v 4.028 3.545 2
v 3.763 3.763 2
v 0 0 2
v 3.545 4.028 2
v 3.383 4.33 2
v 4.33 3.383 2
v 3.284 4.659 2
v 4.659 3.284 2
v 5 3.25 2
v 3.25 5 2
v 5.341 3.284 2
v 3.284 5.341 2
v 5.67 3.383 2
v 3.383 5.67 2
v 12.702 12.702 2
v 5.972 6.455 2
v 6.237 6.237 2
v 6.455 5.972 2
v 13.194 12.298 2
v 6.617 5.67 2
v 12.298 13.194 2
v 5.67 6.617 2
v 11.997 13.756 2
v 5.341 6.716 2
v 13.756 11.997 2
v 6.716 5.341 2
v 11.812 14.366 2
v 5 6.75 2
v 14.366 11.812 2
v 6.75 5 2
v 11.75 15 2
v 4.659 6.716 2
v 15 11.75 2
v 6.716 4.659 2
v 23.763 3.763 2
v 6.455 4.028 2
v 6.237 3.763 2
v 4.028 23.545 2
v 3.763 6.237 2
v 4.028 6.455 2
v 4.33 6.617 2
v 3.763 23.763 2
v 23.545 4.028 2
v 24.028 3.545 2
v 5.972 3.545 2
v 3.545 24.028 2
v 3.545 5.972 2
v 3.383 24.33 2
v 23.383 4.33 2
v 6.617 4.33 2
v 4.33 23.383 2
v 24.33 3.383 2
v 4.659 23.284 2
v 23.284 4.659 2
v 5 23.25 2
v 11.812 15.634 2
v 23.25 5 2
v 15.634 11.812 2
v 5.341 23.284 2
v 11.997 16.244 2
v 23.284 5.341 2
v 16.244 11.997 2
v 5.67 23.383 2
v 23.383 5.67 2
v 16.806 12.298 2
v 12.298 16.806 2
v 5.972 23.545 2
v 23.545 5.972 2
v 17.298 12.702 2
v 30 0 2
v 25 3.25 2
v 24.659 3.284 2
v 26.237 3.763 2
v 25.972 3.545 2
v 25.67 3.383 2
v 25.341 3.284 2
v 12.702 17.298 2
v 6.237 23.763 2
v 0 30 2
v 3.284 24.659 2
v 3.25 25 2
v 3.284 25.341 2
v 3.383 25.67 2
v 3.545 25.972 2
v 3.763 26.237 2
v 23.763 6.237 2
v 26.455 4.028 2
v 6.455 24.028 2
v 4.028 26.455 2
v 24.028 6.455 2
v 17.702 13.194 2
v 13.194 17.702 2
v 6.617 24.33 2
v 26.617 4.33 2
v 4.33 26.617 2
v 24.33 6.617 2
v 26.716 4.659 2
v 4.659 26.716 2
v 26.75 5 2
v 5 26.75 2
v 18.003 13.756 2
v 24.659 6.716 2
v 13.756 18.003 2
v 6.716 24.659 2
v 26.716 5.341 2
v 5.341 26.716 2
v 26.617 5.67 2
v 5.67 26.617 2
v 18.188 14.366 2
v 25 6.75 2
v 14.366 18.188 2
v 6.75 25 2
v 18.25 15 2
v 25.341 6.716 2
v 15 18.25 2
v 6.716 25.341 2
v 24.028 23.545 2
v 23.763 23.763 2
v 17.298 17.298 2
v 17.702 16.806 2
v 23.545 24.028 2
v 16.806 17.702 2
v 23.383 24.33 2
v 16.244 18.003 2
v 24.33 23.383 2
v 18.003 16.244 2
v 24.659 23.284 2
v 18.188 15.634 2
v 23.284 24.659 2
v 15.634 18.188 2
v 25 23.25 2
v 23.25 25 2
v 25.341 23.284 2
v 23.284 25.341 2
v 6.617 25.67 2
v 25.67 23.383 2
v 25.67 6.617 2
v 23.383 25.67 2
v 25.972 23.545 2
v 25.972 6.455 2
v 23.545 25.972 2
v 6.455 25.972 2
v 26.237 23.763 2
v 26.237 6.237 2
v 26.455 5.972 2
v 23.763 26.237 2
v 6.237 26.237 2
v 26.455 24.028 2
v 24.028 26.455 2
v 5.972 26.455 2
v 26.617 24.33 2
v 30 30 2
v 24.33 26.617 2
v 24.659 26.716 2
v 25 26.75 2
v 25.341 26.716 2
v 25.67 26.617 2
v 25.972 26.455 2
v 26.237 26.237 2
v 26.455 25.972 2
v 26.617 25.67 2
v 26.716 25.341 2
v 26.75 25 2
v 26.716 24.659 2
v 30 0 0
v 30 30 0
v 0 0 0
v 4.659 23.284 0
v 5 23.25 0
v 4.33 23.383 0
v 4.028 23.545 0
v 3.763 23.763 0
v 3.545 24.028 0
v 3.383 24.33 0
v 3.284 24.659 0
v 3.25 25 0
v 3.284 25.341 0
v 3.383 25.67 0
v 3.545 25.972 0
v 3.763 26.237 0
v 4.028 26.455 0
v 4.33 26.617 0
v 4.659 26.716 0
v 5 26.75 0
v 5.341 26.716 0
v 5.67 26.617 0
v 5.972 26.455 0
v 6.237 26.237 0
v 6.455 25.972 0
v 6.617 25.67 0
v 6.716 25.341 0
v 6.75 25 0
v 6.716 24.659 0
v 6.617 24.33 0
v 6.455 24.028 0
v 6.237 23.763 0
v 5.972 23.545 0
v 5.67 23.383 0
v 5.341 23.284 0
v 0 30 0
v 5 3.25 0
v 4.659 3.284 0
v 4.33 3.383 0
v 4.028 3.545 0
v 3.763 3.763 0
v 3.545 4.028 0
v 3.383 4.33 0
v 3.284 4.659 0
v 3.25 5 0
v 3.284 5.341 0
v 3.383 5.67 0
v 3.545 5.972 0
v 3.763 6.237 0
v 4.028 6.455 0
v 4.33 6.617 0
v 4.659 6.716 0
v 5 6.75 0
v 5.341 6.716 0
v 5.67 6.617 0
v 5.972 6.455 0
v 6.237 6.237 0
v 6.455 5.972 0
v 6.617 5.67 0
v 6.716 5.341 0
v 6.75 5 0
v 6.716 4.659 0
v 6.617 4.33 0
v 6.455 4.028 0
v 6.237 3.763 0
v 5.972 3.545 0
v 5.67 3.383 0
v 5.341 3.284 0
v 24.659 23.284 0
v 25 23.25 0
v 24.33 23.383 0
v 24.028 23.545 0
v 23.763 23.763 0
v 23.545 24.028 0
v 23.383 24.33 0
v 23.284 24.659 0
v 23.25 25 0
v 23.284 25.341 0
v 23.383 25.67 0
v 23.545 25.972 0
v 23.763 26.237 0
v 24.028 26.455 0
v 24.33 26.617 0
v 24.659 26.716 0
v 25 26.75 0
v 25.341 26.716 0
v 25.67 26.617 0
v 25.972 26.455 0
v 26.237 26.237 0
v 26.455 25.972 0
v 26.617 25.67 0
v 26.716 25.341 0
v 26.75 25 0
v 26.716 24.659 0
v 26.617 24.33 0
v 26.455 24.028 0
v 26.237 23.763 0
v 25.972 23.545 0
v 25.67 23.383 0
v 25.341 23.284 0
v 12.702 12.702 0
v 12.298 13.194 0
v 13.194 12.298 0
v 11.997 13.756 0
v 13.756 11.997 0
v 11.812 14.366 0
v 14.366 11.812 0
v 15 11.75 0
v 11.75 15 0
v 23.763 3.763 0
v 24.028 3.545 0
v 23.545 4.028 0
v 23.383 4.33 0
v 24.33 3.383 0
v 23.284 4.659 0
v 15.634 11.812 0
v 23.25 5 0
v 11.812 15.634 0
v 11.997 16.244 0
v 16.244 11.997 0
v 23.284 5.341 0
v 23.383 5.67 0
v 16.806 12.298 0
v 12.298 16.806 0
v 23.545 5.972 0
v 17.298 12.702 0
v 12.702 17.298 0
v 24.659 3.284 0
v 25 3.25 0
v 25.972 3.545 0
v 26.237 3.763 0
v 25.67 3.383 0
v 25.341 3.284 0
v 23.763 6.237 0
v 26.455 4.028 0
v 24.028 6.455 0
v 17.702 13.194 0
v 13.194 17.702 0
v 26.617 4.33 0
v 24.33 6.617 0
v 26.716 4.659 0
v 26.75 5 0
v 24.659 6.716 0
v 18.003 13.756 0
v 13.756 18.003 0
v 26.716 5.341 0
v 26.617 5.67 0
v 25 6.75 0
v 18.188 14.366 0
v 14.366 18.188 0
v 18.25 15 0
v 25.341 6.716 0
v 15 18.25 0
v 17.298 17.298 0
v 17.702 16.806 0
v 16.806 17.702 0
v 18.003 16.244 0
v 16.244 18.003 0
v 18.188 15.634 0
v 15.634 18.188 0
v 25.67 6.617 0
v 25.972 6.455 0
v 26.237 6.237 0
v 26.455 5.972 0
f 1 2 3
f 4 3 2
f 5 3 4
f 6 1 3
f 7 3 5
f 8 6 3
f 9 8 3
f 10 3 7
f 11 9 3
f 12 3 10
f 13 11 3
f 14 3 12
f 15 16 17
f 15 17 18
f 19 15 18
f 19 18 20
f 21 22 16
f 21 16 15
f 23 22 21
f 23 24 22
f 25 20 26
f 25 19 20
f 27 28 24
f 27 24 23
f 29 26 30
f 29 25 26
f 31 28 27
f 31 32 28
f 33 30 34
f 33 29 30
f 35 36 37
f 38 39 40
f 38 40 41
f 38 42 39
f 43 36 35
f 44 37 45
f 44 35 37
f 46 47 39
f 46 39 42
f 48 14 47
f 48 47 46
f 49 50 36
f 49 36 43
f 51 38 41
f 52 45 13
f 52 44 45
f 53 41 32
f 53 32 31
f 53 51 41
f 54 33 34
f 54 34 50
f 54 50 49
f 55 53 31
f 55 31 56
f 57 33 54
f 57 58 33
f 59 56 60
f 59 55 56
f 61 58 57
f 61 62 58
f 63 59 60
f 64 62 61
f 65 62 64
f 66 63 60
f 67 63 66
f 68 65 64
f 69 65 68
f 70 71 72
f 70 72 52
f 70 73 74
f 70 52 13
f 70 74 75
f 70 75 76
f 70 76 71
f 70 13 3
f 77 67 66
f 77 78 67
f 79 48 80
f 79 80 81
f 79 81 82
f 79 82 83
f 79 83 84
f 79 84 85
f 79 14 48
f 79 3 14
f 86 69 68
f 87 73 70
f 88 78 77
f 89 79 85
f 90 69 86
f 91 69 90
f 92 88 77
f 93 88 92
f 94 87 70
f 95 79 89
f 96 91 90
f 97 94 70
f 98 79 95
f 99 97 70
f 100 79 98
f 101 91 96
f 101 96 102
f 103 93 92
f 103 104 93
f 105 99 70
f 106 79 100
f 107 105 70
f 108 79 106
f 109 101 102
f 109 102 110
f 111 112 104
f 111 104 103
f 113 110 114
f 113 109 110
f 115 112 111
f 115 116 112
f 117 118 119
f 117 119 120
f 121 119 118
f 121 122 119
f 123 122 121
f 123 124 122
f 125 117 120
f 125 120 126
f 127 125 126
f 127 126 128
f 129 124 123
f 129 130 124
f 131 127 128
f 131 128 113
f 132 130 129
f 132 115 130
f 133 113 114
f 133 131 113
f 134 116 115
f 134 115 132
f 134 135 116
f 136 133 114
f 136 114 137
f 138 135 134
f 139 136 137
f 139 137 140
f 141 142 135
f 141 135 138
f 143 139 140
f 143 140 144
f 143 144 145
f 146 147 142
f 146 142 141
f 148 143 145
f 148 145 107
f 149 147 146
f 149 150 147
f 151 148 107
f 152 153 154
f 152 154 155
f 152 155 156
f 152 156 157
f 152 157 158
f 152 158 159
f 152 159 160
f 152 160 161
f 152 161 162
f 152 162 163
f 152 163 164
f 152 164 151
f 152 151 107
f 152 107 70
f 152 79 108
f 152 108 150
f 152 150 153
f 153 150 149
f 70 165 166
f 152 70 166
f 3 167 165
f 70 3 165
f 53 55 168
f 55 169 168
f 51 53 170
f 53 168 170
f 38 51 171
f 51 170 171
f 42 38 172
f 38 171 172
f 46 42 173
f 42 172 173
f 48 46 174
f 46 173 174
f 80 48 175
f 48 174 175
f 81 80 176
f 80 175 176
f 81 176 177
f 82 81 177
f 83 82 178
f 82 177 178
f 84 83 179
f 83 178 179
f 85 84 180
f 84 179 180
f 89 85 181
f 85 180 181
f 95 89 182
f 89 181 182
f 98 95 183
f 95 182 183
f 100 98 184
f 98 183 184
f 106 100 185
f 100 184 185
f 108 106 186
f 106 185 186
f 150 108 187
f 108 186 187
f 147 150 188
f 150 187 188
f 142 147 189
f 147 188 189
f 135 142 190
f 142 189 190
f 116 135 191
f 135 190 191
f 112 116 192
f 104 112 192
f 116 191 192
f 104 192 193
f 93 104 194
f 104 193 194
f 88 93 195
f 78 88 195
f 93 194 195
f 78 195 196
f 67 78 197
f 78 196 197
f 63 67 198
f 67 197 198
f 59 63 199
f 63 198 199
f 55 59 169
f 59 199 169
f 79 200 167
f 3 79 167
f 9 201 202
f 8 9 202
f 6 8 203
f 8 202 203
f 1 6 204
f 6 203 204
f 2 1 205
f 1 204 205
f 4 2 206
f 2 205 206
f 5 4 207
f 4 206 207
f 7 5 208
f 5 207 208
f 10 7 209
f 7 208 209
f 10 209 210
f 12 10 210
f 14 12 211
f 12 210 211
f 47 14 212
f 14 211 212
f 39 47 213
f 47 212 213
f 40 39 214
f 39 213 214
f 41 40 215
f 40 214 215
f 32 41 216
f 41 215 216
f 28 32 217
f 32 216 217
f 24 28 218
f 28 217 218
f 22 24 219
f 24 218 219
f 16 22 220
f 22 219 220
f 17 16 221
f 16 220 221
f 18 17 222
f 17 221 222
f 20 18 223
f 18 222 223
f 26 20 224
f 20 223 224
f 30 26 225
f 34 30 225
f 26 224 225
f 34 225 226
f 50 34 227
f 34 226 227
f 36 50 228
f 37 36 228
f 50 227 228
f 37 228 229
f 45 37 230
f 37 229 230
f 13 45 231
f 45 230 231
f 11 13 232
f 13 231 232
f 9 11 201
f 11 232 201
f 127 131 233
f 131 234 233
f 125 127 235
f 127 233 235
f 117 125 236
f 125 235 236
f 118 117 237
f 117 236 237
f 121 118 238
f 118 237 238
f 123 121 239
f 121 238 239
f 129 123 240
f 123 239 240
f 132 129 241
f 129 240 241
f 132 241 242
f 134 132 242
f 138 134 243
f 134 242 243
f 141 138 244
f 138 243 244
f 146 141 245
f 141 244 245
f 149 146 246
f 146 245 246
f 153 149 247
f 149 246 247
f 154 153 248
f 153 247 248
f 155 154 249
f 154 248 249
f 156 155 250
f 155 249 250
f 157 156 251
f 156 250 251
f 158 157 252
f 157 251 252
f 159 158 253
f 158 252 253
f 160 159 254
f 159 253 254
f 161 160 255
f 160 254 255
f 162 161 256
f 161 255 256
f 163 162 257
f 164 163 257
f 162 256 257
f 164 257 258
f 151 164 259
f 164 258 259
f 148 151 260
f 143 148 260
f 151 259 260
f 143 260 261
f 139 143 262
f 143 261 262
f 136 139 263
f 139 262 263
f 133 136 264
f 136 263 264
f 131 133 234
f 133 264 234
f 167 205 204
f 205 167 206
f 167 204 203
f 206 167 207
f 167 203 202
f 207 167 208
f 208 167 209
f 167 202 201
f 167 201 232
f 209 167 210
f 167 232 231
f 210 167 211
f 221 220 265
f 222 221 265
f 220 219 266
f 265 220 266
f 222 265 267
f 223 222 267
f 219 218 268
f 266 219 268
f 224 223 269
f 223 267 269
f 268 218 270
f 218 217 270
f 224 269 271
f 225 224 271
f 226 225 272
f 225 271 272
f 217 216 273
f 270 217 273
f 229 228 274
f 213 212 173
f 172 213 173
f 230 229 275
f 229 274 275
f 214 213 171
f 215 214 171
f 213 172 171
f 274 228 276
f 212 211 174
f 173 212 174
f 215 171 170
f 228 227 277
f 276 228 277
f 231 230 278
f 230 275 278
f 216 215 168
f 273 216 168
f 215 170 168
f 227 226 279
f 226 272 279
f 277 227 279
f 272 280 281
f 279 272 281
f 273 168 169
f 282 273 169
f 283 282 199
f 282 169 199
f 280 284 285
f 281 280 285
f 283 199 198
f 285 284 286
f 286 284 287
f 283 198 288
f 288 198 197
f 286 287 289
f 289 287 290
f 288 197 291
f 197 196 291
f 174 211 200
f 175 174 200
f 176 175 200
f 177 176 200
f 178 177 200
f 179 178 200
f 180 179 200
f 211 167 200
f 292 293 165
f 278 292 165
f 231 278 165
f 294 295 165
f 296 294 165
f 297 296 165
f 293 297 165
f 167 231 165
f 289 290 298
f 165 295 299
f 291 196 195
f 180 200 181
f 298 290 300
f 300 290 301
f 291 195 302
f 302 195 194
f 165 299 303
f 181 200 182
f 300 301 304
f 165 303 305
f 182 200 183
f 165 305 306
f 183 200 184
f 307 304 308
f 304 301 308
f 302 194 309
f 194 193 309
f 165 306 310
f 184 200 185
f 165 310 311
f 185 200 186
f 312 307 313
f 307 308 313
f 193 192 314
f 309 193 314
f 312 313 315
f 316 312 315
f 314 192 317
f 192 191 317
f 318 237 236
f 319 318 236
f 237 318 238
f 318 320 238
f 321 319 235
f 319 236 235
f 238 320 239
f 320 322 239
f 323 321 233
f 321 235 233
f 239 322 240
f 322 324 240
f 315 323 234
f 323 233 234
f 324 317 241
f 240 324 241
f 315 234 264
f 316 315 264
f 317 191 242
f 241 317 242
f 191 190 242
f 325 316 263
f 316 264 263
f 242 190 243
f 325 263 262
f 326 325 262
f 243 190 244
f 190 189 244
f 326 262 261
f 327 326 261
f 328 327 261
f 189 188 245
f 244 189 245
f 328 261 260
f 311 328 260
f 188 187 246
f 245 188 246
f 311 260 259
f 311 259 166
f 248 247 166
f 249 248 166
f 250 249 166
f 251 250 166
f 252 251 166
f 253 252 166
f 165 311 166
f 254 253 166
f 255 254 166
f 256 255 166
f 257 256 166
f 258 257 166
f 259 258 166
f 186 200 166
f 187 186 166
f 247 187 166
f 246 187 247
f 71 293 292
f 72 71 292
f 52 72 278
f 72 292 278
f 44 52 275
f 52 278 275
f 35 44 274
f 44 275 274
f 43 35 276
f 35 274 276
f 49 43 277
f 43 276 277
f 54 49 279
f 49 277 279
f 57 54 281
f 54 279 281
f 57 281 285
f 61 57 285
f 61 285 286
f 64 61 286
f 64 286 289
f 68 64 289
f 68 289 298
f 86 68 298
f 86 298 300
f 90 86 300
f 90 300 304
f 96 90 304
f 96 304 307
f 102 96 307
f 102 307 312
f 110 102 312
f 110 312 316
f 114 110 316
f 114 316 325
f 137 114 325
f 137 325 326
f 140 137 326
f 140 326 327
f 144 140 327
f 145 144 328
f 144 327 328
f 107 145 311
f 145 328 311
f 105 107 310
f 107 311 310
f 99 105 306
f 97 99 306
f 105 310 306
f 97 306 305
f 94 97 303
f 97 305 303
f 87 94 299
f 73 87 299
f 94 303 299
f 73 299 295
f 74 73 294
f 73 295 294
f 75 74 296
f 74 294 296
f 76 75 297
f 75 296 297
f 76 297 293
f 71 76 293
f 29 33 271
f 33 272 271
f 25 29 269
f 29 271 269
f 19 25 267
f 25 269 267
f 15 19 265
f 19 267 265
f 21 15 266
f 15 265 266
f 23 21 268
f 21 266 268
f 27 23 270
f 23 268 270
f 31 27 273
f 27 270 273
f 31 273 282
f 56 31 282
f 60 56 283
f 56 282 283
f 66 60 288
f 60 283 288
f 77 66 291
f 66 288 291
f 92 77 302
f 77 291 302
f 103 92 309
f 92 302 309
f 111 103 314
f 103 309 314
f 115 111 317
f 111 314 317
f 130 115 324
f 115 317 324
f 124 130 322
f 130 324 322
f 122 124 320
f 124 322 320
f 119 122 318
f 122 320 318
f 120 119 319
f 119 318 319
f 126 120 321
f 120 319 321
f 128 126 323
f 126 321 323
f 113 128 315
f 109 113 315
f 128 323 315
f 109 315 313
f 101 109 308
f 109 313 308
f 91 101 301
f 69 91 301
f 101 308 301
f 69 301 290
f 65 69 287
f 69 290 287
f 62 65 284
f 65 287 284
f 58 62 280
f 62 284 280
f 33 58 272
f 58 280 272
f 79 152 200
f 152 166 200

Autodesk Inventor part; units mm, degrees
ref_plane "YZ Plane" through (0, 0, 0) normal (1, 0, 0) x (0, 1, 0)
ref_plane "XZ Plane" through (0, 0, 0) normal (0, 1, 0) x (-1, 0, 0)
ref_plane "XY Plane" through (0, 0, 0) normal (0, 0, 1) x (1, 0, 0)
sketch "スケッチ1" plane through (0, 0, 0) normal (0, 0, 1) x (1, 0, 0)
  line L0 (0, 0) -> (30, 0)
  line L1 (30, 0) -> (30, 30)
  line L2 (30, 30) -> (0, 30)
  line L3 (0, 30) -> (0, 0)
  dimension "d0" = 30
  dimension "d1" = 30
extrude "押し出し1" add sketch "スケッチ1" along normal blind 2
sketch "スケッチ2" plane through (0, 0, 2) normal (0, 0, 1) x (1, 0, 0)
  line L0 (30, 0) -> (30, 30) projected
  line L1 (30, 30) -> (0, 30) projected
  line L2 (0, 30) -> (0, 0) projected
  line L3 (0, 0) -> (30, 0) projected
  point P0 (25, 25)
  point P1 (5, 25)
  point P2 (5, 5)
  point P3 (25, 5)
  dimension "d4" = 5
  dimension "d5" = 5
  dimension "d6" = 5
  dimension "d7" = 5
  dimension "d8" = 5
  dimension "d9" = 5
  dimension "d10" = 5
  dimension "d11" = 5
hole "穴1" at (25, 25, 2) at (5, 25, 2) at (5, 5, 2) at (25, 5, 2) direction (0, 0, -1) diameter 3.5 end through all
sketch "スケッチ3" plane through (0, 0, 2) normal (0, 0, 1) x (1, 0, 0)
  line L0 (30, 0) -> (30, 30) projected
  line L1 (30, 30) -> (0, 30) projected
  point P0 (0, 0)
  point P1 (15, 15)
  dimension "d19" = 15
  dimension "d20" = 15
hole "穴2" at (15, 15, 2) direction (0, 0, -1) diameter 6.5 end through all
properties part number "3SR15_ポテンショメータ固定パーツ"
